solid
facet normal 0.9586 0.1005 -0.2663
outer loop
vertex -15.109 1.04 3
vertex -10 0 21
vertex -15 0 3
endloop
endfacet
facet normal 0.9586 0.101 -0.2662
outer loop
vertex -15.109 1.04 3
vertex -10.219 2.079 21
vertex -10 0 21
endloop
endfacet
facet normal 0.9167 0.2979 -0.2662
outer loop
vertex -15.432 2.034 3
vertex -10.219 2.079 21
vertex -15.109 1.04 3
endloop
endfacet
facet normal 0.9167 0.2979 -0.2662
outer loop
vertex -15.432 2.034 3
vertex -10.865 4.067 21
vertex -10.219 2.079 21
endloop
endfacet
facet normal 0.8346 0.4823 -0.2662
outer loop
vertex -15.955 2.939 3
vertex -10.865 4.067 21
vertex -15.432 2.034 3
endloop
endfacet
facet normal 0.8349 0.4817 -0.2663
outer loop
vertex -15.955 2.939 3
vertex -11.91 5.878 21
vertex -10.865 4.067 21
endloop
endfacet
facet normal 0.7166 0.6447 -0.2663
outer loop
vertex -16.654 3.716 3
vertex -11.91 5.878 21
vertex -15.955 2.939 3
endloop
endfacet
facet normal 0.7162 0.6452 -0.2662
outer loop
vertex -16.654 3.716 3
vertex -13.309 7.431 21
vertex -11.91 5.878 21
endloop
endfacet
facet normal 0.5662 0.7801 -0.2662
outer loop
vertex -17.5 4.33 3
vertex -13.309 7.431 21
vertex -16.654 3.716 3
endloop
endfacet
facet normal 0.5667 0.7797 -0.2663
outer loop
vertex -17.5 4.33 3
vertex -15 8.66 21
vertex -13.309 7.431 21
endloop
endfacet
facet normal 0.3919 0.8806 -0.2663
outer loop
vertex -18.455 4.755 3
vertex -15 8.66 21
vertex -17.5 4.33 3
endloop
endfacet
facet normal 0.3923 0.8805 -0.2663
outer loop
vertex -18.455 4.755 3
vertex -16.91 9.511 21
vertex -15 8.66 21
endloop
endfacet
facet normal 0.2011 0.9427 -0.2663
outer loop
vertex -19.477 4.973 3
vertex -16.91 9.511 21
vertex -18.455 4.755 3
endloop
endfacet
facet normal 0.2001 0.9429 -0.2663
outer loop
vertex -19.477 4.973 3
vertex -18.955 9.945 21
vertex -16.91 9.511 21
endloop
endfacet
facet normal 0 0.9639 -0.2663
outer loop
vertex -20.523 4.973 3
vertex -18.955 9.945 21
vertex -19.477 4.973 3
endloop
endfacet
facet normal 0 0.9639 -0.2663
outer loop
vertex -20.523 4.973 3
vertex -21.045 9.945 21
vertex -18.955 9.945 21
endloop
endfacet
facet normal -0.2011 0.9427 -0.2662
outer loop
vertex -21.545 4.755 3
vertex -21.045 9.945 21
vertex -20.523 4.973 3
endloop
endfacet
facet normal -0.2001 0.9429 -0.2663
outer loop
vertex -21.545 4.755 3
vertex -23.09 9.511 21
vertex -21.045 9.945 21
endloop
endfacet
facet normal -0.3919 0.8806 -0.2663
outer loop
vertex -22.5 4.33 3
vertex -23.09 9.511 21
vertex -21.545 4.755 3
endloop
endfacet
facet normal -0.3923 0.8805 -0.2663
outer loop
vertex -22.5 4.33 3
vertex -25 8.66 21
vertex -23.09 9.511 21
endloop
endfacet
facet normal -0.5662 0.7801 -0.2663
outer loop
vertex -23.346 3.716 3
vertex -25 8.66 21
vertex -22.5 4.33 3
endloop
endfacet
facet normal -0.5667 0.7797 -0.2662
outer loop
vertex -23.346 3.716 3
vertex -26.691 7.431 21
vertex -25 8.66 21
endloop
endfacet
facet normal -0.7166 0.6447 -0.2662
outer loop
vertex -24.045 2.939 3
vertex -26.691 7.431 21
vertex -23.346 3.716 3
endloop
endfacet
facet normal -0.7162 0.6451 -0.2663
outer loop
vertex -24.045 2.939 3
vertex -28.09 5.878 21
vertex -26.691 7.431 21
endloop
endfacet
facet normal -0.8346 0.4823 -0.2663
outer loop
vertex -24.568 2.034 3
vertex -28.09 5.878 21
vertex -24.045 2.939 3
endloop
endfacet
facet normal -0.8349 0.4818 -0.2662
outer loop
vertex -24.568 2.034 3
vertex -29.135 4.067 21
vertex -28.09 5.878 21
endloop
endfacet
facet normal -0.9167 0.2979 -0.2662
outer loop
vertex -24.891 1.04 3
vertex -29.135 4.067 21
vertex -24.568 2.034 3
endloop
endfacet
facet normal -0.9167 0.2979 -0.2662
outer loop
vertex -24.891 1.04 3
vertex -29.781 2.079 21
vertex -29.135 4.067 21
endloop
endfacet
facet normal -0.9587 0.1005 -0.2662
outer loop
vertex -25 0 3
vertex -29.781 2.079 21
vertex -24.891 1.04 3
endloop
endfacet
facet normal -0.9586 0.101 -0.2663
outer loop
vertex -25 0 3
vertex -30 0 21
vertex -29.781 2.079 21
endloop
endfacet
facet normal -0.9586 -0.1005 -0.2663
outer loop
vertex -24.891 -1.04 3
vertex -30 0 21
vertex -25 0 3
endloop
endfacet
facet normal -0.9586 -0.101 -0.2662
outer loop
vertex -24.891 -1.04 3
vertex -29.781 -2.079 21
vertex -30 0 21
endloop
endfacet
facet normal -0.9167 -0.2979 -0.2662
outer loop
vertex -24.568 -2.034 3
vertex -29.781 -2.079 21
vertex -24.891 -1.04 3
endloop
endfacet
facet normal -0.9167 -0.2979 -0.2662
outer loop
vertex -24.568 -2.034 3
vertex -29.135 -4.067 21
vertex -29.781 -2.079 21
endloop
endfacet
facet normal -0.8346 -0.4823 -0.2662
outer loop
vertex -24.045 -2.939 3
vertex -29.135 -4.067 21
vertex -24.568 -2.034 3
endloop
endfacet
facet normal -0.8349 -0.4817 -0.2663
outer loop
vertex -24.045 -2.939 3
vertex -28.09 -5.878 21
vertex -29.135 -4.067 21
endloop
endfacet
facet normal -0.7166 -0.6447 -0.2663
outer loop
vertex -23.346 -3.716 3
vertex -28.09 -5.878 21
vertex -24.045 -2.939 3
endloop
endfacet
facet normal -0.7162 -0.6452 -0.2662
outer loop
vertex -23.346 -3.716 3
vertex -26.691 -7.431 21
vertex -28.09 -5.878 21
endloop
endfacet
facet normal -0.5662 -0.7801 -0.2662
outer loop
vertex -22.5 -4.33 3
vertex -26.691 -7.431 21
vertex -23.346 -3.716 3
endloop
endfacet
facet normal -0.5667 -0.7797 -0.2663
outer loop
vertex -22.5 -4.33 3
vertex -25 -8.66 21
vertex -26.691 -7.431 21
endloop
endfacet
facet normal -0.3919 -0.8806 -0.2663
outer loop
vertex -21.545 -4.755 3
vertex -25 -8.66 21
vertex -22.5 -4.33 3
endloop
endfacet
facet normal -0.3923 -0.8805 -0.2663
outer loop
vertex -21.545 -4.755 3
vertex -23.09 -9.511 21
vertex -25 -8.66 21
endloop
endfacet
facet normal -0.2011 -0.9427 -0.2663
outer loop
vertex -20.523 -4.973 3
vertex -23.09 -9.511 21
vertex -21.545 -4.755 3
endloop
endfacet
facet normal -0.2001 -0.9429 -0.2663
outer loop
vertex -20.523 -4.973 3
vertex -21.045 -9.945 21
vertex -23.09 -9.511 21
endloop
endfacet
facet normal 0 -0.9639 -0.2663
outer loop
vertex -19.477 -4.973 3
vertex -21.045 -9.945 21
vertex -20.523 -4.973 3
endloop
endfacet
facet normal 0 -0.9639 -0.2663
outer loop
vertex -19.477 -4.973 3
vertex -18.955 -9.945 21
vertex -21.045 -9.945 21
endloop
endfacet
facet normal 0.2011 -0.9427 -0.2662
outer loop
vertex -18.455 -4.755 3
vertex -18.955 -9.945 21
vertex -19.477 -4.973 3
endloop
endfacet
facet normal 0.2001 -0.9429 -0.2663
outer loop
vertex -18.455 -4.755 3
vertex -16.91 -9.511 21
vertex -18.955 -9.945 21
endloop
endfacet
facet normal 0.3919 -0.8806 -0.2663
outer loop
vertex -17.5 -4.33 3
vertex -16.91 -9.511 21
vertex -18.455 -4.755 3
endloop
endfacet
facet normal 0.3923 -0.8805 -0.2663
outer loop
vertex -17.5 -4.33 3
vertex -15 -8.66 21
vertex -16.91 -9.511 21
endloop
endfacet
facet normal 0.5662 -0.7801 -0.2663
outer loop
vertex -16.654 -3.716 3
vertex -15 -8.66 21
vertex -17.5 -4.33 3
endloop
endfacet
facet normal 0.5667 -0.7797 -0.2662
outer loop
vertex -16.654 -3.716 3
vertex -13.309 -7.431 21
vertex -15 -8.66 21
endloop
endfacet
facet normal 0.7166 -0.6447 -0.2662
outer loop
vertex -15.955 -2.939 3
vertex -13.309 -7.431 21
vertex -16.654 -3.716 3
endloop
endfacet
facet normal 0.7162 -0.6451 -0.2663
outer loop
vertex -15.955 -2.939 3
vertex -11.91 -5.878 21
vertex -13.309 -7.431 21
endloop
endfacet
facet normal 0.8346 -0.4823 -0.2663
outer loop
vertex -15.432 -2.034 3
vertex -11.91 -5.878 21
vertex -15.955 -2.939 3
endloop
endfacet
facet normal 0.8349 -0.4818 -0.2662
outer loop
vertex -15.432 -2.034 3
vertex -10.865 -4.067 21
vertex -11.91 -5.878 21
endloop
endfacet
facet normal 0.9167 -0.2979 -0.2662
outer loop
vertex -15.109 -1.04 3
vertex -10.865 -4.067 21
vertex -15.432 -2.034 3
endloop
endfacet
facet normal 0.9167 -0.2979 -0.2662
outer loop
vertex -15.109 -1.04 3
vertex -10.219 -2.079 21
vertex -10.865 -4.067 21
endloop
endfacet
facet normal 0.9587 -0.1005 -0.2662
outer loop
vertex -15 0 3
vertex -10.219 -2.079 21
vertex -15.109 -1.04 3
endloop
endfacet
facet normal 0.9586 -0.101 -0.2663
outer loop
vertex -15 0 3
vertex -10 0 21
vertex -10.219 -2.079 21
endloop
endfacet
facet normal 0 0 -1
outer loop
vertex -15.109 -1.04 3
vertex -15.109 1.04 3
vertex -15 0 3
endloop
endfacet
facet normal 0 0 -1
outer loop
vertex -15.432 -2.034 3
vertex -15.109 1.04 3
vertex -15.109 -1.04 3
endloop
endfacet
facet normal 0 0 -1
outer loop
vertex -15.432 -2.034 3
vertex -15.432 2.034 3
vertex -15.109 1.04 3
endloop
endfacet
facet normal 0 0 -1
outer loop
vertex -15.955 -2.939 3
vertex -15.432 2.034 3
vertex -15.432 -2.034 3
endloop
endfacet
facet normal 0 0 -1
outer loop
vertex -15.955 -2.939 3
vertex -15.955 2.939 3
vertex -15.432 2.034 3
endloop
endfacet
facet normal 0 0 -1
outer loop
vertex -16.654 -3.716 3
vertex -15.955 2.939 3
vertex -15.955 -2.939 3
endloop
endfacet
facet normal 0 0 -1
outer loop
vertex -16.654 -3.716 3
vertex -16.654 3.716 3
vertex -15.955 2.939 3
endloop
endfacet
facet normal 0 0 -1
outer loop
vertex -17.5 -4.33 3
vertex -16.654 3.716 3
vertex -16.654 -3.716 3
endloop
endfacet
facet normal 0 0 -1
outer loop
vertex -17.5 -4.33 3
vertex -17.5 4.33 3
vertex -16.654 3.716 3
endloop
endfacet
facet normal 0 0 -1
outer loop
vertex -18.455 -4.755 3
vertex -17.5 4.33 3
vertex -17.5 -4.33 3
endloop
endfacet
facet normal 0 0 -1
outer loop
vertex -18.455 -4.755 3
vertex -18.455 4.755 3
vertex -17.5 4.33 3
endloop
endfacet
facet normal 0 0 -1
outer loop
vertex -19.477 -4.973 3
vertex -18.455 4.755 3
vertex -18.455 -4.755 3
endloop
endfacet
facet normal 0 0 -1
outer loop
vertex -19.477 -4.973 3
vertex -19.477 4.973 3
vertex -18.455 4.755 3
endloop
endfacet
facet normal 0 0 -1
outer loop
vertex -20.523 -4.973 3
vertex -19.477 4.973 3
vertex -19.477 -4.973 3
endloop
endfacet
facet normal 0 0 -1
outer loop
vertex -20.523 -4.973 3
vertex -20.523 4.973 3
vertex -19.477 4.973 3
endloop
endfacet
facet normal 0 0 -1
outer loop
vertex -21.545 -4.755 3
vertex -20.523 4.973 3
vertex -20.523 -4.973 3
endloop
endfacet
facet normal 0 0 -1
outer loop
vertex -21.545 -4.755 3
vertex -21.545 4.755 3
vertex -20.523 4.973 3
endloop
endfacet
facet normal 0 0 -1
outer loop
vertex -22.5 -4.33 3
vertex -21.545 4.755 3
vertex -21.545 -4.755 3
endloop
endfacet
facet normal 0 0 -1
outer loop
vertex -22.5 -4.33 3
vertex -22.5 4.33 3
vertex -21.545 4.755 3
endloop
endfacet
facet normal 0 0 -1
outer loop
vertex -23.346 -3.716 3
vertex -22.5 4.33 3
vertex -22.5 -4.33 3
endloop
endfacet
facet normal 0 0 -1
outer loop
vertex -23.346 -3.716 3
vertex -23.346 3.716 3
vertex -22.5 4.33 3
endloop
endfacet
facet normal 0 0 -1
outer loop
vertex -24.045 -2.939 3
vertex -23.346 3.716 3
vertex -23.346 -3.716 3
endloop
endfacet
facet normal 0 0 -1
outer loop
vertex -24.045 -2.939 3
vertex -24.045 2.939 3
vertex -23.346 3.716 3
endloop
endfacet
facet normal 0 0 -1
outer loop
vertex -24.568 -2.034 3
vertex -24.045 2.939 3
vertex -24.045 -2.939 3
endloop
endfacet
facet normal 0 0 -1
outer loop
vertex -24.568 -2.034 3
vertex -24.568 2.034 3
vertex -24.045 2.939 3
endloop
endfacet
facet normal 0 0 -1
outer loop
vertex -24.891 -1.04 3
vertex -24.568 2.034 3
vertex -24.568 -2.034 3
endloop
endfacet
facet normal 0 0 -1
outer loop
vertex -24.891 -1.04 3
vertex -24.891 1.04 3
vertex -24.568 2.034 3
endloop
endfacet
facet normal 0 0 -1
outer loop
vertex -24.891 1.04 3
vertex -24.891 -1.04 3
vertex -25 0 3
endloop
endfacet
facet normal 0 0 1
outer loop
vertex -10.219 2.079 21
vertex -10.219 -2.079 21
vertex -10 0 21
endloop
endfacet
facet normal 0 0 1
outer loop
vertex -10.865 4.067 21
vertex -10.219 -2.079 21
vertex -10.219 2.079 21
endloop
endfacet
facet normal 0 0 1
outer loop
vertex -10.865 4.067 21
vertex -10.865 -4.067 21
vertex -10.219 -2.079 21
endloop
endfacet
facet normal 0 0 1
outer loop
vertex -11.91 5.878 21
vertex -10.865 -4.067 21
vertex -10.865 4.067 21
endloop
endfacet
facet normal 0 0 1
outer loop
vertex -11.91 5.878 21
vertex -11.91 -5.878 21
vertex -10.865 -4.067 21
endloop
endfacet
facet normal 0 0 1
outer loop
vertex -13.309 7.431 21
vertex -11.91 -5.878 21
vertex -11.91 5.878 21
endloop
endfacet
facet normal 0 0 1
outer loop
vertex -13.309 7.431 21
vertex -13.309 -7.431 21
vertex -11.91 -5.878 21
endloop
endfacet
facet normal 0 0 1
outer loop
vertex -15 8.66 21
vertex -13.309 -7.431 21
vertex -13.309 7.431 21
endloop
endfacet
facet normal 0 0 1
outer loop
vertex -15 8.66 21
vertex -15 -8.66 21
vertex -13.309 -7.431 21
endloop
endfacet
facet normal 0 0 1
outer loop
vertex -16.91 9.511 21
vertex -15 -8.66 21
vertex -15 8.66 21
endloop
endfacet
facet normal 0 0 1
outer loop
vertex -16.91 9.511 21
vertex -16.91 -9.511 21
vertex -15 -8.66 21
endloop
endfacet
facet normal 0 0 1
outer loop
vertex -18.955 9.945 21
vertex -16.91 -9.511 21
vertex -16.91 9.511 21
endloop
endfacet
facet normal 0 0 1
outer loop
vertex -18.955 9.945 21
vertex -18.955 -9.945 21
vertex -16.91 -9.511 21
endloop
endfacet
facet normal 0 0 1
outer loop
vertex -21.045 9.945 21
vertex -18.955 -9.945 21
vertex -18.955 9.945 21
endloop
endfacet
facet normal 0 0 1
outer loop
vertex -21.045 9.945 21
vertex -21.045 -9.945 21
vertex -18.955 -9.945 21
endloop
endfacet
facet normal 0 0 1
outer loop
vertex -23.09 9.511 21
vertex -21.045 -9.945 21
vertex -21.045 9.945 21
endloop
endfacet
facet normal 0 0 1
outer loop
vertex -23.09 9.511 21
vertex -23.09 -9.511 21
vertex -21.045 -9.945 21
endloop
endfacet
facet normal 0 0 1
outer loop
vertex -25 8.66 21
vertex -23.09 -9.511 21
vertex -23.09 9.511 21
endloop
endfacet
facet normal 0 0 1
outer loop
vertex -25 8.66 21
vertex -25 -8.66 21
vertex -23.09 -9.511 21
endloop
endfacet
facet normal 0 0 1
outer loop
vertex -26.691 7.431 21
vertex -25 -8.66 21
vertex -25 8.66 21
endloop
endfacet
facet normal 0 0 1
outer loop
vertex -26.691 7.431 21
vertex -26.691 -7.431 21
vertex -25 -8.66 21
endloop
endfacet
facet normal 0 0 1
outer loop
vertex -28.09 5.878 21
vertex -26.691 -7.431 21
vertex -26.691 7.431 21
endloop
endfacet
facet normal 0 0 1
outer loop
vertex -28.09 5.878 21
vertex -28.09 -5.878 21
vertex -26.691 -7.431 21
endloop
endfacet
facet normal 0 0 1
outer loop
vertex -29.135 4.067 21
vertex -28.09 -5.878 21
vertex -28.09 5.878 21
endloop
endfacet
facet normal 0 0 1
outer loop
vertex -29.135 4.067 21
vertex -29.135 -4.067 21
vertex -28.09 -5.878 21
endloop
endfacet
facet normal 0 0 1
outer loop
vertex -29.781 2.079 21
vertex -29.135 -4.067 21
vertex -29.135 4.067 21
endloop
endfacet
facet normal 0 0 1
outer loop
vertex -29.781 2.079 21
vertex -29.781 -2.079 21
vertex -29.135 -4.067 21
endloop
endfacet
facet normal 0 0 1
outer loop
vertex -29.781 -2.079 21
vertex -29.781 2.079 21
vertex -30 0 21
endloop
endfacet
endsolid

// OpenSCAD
translate([-20, 0, 12]) cylinder(h=18, r1=5, r2=10, center=true);
